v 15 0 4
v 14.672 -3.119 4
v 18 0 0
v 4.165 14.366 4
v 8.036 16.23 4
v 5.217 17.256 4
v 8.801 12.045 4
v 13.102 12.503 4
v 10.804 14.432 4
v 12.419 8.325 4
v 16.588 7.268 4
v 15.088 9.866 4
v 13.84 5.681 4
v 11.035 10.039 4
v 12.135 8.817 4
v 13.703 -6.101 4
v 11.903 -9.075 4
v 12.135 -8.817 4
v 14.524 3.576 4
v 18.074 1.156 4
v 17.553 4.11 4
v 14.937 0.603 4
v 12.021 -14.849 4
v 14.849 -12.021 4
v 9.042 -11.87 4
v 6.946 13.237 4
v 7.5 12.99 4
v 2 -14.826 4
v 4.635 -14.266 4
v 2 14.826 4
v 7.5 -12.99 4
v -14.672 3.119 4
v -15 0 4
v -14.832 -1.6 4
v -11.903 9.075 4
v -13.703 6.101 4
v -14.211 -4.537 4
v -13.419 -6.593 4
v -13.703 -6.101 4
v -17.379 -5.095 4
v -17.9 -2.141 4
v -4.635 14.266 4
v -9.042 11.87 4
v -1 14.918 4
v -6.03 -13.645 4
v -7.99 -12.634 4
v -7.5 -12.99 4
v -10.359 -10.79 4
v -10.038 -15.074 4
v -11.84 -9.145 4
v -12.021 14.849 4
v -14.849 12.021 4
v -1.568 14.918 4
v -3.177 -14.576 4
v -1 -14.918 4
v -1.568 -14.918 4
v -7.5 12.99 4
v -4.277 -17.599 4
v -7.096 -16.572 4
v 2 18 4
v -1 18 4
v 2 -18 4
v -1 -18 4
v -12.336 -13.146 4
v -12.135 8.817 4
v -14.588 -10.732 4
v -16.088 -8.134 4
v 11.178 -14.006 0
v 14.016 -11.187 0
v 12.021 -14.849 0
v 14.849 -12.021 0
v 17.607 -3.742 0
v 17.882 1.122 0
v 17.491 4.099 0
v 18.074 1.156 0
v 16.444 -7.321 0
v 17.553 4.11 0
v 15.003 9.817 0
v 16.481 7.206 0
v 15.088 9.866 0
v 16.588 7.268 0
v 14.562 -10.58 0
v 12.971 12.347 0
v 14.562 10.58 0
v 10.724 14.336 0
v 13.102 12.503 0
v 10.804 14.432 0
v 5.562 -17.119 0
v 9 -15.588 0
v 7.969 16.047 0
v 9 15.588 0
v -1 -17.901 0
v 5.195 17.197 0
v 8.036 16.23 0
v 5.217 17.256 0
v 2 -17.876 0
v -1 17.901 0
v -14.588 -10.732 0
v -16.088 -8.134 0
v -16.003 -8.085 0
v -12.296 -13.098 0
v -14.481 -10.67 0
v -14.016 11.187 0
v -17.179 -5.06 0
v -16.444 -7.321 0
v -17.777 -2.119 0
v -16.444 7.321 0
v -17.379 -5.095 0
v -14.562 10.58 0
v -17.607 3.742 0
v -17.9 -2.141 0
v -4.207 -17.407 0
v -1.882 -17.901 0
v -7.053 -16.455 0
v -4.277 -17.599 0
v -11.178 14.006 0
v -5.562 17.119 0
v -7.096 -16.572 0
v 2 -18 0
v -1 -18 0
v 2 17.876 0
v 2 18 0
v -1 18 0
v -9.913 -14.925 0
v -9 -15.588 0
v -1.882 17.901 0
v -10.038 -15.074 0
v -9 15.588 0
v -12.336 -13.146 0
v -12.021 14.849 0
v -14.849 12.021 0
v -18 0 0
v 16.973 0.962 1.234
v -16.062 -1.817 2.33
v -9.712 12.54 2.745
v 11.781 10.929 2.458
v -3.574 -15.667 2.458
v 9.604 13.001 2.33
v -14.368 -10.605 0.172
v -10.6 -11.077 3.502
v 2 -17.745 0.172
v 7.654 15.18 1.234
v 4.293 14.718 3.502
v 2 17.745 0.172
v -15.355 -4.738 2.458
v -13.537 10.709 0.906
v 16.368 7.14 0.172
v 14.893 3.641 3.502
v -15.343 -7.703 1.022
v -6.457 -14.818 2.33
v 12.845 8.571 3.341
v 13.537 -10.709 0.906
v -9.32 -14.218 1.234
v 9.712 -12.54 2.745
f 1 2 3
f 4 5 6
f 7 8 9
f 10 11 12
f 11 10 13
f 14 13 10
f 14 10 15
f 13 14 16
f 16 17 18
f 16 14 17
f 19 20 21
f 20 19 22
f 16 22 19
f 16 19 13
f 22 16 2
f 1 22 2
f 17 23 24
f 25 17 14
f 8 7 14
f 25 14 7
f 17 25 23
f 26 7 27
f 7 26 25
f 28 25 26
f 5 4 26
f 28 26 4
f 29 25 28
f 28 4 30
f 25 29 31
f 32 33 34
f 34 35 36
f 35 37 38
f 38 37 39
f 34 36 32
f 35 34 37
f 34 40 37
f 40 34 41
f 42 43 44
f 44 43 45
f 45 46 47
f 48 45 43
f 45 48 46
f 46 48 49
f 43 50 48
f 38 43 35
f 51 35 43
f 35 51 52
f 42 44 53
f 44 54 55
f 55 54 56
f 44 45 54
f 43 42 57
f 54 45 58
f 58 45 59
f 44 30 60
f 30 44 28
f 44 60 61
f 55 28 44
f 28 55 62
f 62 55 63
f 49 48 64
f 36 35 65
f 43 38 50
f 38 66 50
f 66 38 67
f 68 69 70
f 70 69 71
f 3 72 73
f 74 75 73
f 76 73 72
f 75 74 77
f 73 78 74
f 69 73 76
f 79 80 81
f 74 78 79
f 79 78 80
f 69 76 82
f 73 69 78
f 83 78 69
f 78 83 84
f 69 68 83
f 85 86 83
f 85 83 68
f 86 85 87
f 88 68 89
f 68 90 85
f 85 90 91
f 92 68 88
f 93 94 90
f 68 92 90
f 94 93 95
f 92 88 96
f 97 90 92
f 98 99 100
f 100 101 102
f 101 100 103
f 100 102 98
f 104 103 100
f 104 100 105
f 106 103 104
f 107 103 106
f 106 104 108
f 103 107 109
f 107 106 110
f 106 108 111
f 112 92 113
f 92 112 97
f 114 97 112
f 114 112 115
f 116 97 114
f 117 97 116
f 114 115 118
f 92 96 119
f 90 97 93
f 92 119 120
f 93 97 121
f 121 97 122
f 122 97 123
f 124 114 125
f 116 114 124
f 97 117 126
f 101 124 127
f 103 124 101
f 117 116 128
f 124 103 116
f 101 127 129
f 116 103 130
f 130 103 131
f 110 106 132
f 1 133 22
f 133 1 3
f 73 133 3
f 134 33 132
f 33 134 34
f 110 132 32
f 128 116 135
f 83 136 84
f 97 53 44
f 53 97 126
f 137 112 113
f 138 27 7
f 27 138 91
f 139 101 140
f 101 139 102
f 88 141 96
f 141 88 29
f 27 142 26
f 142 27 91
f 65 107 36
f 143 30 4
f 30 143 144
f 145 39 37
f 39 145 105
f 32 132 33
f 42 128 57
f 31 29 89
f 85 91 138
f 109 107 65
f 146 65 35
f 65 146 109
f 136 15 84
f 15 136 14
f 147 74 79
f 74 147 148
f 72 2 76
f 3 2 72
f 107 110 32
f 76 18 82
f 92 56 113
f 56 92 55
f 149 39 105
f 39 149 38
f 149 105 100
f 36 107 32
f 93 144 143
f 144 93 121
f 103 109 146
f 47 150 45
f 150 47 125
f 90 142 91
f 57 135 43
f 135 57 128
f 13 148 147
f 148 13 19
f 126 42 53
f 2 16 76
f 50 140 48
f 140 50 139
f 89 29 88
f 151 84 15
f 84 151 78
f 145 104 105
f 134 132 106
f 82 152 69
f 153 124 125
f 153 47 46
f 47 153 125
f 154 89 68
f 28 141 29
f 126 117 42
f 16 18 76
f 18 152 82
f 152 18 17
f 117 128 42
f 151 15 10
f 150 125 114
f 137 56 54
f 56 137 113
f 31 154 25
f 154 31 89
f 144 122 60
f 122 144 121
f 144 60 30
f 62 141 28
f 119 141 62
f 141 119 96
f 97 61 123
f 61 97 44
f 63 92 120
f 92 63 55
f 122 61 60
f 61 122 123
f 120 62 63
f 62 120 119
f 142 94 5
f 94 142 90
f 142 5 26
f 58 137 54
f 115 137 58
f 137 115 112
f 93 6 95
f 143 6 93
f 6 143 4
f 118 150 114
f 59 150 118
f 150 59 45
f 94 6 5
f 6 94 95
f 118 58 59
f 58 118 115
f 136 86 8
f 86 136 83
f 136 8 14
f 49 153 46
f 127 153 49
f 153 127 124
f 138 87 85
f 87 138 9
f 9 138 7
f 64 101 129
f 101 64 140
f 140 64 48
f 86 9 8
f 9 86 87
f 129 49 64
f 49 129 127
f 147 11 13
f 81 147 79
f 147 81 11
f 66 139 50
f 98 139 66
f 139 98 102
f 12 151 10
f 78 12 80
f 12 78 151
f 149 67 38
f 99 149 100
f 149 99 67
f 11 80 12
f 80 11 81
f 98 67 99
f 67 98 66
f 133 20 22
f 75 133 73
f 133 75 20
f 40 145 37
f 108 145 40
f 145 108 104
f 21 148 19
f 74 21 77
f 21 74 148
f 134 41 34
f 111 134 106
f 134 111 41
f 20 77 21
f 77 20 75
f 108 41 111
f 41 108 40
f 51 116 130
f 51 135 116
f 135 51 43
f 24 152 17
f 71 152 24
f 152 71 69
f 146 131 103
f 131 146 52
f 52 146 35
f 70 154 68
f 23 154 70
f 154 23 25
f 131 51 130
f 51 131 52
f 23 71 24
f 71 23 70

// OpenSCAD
//SimpleAngleBase V2 by Mark Tabije on 10/2/2016
//  for use with the Wasabi Miniature Wargame 
//  see Thingiverse for licensing information.
//    http://www.thingiverse.com/thing:1802234


//Level is represented by vertical Bars (Hero has no bars).
level = 5; //[0:5]

//Ability is epresented by a Triange = Range, Square = Direct, Circle = Sneak
ability = "Direct"; // [Range, Direct, Sneak]

//Top Diameter in mm
top = 30;

//Bottom Diameter in mm (recommend at least 6mm bigger than Top)
bottom = 36;

//Thickness of the Base in mm
thickness = 4; 

//Advanced Setting - Angle between Level Bars (tipically 20)
angleBar = 20;


cylinder(h=thickness,r1=bottom/2,r2=top/2);

//Level 1
if(level >= 1)
    translate([-1,-bottom/2,0])cube([3,bottom,thickness]);

//Level 2
if(level >= 2)
    rotate([0,0,-(angleBar)])translate([-1,-bottom/2,0])cube([3,bottom,thickness]);

//Level 3
if(level >= 3)
    rotate([0,0,-(angleBar*2)])translate([-1,-bottom/2,0])cube([3,bottom,thickness]);

//Level 4
if(level >= 4)
    rotate([0,0,-(angleBar*3)])translate([-1,-bottom/2,0])cube([3,bottom,thickness]);

//Level 5
if(level >= 5)
    rotate([0,0,-(angleBar*4)])translate([-1,-bottom/2,0])cube([3,bottom,thickness]);

//Range - Triangle
if(ability == "Range")
    rotate([90,0,45])translate([0,0,-(bottom+2)/2])linear_extrude(height=bottom+2)polygon([[-(thickness-1),0],[thickness-1,0],[0,thickness]]);

//Direct - Square
if(ability == "Direct")
    rotate([0,0,45])translate([-(thickness/2),-(bottom+2)/2,0])cube([thickness,bottom+2,thickness]);

//Sneak - Circle
if(ability == "Sneak")
    rotate([90,0,45])translate([0,thickness/2,-(bottom+2)/2])cylinder(h=bottom+2,r=thickness/2);
